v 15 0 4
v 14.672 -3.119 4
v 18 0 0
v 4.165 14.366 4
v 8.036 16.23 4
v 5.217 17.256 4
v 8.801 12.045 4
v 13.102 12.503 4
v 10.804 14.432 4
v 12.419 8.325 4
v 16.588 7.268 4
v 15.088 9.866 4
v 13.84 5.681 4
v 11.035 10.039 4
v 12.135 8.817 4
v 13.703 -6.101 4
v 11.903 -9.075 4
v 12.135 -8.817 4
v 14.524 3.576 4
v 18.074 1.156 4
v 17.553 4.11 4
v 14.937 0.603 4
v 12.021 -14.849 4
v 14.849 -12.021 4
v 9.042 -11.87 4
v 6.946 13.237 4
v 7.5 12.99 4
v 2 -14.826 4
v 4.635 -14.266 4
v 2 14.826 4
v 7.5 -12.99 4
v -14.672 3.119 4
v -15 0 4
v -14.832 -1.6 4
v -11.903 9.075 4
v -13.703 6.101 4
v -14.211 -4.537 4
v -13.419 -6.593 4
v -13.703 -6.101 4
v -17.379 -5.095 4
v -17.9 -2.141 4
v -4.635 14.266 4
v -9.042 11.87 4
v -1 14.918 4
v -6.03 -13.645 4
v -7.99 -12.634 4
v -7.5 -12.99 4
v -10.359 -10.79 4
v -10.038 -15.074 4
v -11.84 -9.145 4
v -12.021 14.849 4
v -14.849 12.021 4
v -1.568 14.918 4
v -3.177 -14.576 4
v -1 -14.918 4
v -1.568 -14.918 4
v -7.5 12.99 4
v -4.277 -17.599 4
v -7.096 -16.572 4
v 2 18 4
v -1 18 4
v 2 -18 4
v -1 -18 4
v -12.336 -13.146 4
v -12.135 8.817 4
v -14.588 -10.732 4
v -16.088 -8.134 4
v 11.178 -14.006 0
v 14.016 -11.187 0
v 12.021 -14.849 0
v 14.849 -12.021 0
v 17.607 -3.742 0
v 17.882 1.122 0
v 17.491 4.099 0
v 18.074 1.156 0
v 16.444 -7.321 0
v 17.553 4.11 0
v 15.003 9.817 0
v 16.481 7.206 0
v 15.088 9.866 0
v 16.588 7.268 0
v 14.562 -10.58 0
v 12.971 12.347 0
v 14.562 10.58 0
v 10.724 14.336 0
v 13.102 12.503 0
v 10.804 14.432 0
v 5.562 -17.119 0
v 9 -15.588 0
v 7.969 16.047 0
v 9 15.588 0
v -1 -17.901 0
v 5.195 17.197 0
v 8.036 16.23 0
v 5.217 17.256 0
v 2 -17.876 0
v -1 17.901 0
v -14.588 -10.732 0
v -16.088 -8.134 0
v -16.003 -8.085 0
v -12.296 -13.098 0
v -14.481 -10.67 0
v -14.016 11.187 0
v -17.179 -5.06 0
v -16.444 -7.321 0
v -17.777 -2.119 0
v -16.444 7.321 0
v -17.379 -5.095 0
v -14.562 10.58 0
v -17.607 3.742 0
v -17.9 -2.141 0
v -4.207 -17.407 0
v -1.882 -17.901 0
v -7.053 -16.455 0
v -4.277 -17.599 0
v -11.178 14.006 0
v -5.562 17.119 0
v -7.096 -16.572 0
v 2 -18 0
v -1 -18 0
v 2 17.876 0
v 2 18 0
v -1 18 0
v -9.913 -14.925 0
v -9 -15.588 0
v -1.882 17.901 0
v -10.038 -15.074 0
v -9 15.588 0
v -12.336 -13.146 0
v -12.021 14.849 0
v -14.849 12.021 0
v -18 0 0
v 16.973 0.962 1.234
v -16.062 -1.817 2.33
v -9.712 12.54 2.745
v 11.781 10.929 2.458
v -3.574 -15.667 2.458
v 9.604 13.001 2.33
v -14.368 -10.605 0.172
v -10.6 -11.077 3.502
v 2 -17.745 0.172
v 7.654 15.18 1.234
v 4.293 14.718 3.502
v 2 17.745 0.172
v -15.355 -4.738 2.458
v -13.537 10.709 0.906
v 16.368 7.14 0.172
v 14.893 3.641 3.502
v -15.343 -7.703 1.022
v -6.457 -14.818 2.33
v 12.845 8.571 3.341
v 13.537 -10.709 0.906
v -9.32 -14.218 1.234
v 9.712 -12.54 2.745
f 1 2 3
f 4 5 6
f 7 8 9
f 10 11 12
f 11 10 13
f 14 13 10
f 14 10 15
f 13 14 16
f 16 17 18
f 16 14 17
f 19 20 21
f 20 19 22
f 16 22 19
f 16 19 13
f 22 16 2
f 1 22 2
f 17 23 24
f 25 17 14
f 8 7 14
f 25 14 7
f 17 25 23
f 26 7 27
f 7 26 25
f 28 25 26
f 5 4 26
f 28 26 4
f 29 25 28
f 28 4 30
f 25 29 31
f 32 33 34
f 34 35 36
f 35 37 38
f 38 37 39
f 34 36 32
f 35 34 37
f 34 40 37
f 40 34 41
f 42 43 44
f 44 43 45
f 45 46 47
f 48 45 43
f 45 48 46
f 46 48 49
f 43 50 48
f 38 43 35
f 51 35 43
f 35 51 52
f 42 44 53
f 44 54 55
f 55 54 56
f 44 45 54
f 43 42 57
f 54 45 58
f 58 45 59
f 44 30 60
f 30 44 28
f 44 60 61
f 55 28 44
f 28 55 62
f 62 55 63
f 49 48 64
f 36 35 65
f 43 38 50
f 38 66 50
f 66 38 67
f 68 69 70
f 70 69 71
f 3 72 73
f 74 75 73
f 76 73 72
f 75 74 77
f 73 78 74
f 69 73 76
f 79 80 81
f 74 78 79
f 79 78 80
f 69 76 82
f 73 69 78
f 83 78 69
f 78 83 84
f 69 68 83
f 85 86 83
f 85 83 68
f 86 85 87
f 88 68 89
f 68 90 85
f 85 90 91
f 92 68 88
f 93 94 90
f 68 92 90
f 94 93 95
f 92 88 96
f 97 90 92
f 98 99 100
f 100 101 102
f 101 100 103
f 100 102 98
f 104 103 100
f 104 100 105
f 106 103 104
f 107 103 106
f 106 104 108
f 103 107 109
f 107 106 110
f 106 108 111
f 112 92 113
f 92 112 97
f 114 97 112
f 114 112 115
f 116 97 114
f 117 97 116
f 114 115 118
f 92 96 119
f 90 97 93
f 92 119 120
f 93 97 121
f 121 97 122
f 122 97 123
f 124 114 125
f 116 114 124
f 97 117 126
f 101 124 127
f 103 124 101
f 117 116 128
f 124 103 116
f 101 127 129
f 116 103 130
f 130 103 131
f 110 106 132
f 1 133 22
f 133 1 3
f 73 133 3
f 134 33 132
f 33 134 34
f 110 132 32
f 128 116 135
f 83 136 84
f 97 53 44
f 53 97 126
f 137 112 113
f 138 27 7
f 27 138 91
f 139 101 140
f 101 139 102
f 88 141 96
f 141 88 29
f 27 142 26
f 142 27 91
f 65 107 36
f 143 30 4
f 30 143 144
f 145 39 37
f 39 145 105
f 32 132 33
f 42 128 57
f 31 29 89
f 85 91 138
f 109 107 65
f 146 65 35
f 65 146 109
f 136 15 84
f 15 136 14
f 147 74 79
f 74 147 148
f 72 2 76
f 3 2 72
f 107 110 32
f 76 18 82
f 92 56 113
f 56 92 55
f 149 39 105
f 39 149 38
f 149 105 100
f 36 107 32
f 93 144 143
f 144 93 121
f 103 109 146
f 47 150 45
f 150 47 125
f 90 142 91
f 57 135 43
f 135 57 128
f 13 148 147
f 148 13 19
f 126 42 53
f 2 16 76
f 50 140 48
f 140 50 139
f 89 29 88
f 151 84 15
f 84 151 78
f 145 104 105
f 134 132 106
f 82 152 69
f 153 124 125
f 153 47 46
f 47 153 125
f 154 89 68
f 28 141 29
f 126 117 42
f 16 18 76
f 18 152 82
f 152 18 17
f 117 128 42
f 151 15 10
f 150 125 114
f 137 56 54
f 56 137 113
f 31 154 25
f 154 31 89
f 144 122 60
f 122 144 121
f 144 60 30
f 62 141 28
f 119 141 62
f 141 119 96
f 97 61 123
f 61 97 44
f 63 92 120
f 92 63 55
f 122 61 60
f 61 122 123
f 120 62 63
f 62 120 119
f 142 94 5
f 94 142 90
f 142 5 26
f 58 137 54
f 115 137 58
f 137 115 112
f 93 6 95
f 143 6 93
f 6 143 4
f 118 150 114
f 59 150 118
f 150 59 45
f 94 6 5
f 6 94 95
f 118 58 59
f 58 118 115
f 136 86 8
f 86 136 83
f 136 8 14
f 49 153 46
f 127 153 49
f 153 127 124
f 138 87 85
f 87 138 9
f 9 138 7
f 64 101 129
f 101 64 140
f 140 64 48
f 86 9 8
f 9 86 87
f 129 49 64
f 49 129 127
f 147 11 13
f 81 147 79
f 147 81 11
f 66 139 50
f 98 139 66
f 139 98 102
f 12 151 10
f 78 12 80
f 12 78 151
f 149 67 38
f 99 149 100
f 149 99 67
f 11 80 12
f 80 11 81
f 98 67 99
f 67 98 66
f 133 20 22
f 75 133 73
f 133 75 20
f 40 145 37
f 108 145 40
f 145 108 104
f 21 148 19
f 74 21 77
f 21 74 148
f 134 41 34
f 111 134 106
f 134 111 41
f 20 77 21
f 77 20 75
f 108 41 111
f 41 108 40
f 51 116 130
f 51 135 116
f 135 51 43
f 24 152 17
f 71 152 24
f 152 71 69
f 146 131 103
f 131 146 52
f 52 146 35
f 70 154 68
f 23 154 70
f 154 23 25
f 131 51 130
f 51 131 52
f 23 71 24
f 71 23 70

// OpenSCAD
//SimpleAngleBase V2 by Mark Tabije on 10/2/2016
//  for use with the Wasabi Miniature Wargame 
//  see Thingiverse for licensing information.
//    http://www.thingiverse.com/thing:1802234


//Level is represented by vertical Bars (Hero has no bars).
level = 5; //[0:5]

//Ability is epresented by a Triange = Range, Square = Direct, Circle = Sneak
ability = "Direct"; // [Range, Direct, Sneak]

//Top Diameter in mm
top = 30;

//Bottom Diameter in mm (recommend at least 6mm bigger than Top)
bottom = 36;

//Thickness of the Base in mm
thickness = 4; 

//Advanced Setting - Angle between Level Bars (tipically 20)
angleBar = 20;


cylinder(h=thickness,r1=bottom/2,r2=top/2);

//Level 1
if(level >= 1)
    translate([-1,-bottom/2,0])cube([3,bottom,thickness]);

//Level 2
if(level >= 2)
    rotate([0,0,-(angleBar)])translate([-1,-bottom/2,0])cube([3,bottom,thickness]);

//Level 3
if(level >= 3)
    rotate([0,0,-(angleBar*2)])translate([-1,-bottom/2,0])cube([3,bottom,thickness]);

//Level 4
if(level >= 4)
    rotate([0,0,-(angleBar*3)])translate([-1,-bottom/2,0])cube([3,bottom,thickness]);

//Level 5
if(level >= 5)
    rotate([0,0,-(angleBar*4)])translate([-1,-bottom/2,0])cube([3,bottom,thickness]);

//Range - Triangle
if(ability == "Range")
    rotate([90,0,45])translate([0,0,-(bottom+2)/2])linear_extrude(height=bottom+2)polygon([[-(thickness-1),0],[thickness-1,0],[0,thickness]]);

//Direct - Square
if(ability == "Direct")
    rotate([0,0,45])translate([-(thickness/2),-(bottom+2)/2,0])cube([thickness,bottom+2,thickness]);

//Sneak - Circle
if(ability == "Sneak")
    rotate([90,0,45])translate([0,thickness/2,-(bottom+2)/2])cylinder(h=bottom+2,r=thickness/2);
